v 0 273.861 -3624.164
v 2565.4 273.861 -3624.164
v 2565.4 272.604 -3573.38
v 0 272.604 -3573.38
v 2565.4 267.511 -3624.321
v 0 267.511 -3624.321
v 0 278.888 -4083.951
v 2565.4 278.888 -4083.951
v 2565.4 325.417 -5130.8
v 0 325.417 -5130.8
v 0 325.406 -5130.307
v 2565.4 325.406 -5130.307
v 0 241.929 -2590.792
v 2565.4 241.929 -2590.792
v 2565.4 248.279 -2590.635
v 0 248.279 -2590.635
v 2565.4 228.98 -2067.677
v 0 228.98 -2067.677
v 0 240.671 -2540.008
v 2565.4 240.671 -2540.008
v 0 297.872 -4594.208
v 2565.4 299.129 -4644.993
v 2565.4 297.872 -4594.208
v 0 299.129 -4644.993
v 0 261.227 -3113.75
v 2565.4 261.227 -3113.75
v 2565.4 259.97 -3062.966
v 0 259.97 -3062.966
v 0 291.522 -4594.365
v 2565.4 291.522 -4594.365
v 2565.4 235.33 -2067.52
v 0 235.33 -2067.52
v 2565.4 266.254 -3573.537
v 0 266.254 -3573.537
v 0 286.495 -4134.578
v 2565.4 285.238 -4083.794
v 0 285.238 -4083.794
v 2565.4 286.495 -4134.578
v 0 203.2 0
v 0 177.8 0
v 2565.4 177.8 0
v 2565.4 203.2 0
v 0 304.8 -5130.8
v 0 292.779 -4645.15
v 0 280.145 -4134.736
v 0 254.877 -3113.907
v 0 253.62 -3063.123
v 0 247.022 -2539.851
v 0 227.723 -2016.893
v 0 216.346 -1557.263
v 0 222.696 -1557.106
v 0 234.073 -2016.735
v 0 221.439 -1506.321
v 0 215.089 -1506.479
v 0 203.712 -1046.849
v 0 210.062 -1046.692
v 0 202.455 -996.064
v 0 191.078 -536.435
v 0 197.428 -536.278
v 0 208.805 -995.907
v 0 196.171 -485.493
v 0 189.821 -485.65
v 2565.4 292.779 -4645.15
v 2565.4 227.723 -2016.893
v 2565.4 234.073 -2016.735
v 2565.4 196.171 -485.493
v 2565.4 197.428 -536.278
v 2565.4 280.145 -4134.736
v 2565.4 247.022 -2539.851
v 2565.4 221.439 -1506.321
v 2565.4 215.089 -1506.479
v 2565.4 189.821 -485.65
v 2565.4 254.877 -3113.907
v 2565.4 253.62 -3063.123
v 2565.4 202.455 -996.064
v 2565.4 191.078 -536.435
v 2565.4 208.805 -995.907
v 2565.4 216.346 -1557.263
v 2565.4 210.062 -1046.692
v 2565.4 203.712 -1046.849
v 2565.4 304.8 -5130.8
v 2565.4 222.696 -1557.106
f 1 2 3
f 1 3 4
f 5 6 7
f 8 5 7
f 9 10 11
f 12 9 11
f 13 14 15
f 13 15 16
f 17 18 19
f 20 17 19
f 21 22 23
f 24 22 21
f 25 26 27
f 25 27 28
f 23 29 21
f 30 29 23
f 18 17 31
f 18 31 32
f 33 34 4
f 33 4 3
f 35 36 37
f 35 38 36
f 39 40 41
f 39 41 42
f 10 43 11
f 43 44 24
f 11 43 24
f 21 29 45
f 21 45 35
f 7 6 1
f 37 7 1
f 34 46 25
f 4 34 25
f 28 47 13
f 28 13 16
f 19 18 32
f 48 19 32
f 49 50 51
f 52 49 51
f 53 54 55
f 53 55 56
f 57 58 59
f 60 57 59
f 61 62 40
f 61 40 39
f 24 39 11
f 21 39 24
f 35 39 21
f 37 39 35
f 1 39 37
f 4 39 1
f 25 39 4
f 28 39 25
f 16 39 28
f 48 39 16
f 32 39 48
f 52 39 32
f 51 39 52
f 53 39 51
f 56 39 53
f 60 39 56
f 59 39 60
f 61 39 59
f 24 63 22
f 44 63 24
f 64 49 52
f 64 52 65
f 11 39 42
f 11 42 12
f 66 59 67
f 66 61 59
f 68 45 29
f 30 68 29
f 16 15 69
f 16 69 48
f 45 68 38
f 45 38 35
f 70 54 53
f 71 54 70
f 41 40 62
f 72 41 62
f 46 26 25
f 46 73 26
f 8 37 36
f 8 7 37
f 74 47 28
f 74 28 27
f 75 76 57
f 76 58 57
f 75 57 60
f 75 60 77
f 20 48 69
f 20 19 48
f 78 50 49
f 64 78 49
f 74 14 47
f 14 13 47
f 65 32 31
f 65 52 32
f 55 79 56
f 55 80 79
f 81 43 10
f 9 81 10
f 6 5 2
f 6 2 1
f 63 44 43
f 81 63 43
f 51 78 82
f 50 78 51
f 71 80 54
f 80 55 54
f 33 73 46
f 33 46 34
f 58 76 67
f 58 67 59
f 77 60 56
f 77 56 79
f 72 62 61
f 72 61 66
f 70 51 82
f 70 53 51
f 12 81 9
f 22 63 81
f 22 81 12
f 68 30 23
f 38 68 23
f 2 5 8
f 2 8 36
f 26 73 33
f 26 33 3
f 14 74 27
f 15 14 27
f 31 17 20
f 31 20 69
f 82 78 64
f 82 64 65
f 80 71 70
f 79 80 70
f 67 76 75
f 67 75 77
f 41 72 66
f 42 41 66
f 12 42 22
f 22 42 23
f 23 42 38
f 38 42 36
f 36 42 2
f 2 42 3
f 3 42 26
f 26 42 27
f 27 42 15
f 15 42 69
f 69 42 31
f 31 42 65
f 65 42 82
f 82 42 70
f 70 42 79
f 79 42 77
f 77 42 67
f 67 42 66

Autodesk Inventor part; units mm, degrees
ref_plane "YZ Plane" through (0, 0, 0) normal (1, 0, 0) x (0, 1, 0)
ref_plane "XZ Plane" through (0, 0, 0) normal (0, 1, 0) x (-1, 0, 0)
ref_plane "XY Plane" through (0, 0, 0) normal (0, 0, 1) x (1, 0, 0)
sketch "Sketch1" plane through (0, 0, 0) normal (1, 0, 0) x (0, 1, 0)
  line L0 (0, 0) -> (177.8, 0) construction
  line L1 (177.8, 0) -> (177.8, -5130.8) construction
  line L2 (177.8, -5130.8) -> (304.8, -5130.8) construction
  line L3 (177.8, 0) -> (304.8, -5130.8)
  line L4 (177.8, 0) -> (203.2, 0)
  line L5 (203.2, 0) -> (325.4055, -5130.3067)
  line L6 (304.8, -5130.8) -> (325.4172, -5130.8)
  line L7 (304.8, -5130.8) -> (325.4172, -5130.8) construction
  line L8 (325.4172, -5130.8) -> (325.4055, -5130.3067)
  dimension "d0" = 177.8
  dimension "d1" = 5130.8
  dimension "d2" = 127
  dimension "d3" = 25.4
  dimension "d4" = 0
extrude "Extrusion1" add sketch "Sketch1" along normal blind 2565.4
sketch "Sketch2" plane through (0, 304.8, -5130.8) normal (0, -0.9996938, -0.0247449) x (1, 0, 0)
  line L0 (0, 5131.743) -> (2565.4, 5131.743) construction
  line L1 (1282.7, 5131.743) -> (1282.7, 0) construction
  line L2 (0, 0) -> (2565.4, 0) construction
  line L3 (2565.4, 5132.3715) -> (2565.4, 0) construction
  line L4 (2565.4, 2566.1858) -> (0, 2566.1858) construction
  line L5 (1282.7, 5131.743) -> (1282.7, 4621.1725) construction
  line L6 (1282.7, 4621.1725) -> (1282.7, 4110.6021) construction
  line L7 (1282.7, 4110.6021) -> (1282.7, 3600.0316) construction
  line L8 (1282.7, 3600.0316) -> (1282.7, 3089.4611) construction
  line L9 (1282.7, 3089.4611) -> (1282.7, 2566.1858) construction
  line L10 (0, 4646.5725) -> (2565.4, 4646.5725)
  line L11 (2565.4, 4646.5725) -> (2565.4, 4595.7725)
  line L12 (2565.4, 4595.7725) -> (0, 4595.7725)
  line L13 (0, 4595.7725) -> (0, 4646.5725)
  line L14 (0, 4646.5725) -> (2565.4, 4595.7725) construction
  line L15 (2565.4, 4646.5725) -> (0, 4595.7725) construction
  line L16 (0, 4136.0021) -> (2565.4, 4136.0021)
  line L17 (2565.4, 4136.0021) -> (2565.4, 4085.2021)
  line L18 (2565.4, 4085.2021) -> (0, 4085.2021)
  line L19 (0, 4085.2021) -> (0, 4136.0021)
  line L20 (0, 4136.0021) -> (2565.4, 4085.2021) construction
  line L21 (2565.4, 4136.0021) -> (0, 4085.2021) construction
  line L22 (0, 3625.4316) -> (2565.4, 3625.4316)
  line L23 (2565.4, 3625.4316) -> (2565.4, 3574.6316)
  line L24 (2565.4, 3574.6316) -> (0, 3574.6316)
  line L25 (0, 3574.6316) -> (0, 3625.4316)
  line L26 (0, 3625.4316) -> (2565.4, 3574.6316) construction
  line L27 (2565.4, 3625.4316) -> (0, 3574.6316) construction
  line L28 (0, 3114.8611) -> (2565.4, 3114.8611)
  line L29 (2565.4, 3114.8611) -> (2565.4, 3064.0611)
  line L30 (2565.4, 3064.0611) -> (0, 3064.0611)
  line L31 (0, 3064.0611) -> (0, 3114.8611)
  line L32 (0, 3114.8611) -> (2565.4, 3064.0611) construction
  line L33 (2565.4, 3114.8611) -> (0, 3064.0611) construction
  line L34 (0, 5132.3715) -> (0, 0) projected
  line L35 (2565.4, 2566.1858) -> (0, 2566.1858)
  line L36 (0, 2566.1858) -> (0, 2591.5858)
  line L37 (0, 2591.5858) -> (2565.4, 2591.5858)
  line L38 (2565.4, 2591.5858) -> (2565.4, 2566.1858)
  point P0 (0, 5136.7712)
  dimension "d7" = 510.5705
  dimension "d8" = 510.5705
  dimension "d9" = 510.5705
  dimension "d10" = 510.5705
  dimension "d11" = 50.8
  dimension "d12" = 50.8
  dimension "d13" = 50.8
  dimension "d14" = 2565.4
  dimension "d15" = 50.8
  dimension "d16" = 25.4
extrude "Extrusion2" cut sketch "Sketch2" against normal blind 6.35
sketch "Sketch3" plane through (0, 304.8, -5130.8) normal (0, -0.9996938, -0.0247449) x (1, 0, 0)
  line L0 (2565.4, 2566.1858) -> (0, 2566.1858) construction
  line L1 (2565.4, 2566.1858) -> (0, 2565.6164) construction
  line L2 (0, -0.5102) -> (0, 5131.743) construction
  point P0 (0, 5136.7712)
mirror "Mirror1" about plane through (2565.4, 241.3, -2565.4) normal (0, -0.0247449, 0.9996938) of "Extrusion2"
properties part number "Roof" material "Aluminum 6061-AHC"
